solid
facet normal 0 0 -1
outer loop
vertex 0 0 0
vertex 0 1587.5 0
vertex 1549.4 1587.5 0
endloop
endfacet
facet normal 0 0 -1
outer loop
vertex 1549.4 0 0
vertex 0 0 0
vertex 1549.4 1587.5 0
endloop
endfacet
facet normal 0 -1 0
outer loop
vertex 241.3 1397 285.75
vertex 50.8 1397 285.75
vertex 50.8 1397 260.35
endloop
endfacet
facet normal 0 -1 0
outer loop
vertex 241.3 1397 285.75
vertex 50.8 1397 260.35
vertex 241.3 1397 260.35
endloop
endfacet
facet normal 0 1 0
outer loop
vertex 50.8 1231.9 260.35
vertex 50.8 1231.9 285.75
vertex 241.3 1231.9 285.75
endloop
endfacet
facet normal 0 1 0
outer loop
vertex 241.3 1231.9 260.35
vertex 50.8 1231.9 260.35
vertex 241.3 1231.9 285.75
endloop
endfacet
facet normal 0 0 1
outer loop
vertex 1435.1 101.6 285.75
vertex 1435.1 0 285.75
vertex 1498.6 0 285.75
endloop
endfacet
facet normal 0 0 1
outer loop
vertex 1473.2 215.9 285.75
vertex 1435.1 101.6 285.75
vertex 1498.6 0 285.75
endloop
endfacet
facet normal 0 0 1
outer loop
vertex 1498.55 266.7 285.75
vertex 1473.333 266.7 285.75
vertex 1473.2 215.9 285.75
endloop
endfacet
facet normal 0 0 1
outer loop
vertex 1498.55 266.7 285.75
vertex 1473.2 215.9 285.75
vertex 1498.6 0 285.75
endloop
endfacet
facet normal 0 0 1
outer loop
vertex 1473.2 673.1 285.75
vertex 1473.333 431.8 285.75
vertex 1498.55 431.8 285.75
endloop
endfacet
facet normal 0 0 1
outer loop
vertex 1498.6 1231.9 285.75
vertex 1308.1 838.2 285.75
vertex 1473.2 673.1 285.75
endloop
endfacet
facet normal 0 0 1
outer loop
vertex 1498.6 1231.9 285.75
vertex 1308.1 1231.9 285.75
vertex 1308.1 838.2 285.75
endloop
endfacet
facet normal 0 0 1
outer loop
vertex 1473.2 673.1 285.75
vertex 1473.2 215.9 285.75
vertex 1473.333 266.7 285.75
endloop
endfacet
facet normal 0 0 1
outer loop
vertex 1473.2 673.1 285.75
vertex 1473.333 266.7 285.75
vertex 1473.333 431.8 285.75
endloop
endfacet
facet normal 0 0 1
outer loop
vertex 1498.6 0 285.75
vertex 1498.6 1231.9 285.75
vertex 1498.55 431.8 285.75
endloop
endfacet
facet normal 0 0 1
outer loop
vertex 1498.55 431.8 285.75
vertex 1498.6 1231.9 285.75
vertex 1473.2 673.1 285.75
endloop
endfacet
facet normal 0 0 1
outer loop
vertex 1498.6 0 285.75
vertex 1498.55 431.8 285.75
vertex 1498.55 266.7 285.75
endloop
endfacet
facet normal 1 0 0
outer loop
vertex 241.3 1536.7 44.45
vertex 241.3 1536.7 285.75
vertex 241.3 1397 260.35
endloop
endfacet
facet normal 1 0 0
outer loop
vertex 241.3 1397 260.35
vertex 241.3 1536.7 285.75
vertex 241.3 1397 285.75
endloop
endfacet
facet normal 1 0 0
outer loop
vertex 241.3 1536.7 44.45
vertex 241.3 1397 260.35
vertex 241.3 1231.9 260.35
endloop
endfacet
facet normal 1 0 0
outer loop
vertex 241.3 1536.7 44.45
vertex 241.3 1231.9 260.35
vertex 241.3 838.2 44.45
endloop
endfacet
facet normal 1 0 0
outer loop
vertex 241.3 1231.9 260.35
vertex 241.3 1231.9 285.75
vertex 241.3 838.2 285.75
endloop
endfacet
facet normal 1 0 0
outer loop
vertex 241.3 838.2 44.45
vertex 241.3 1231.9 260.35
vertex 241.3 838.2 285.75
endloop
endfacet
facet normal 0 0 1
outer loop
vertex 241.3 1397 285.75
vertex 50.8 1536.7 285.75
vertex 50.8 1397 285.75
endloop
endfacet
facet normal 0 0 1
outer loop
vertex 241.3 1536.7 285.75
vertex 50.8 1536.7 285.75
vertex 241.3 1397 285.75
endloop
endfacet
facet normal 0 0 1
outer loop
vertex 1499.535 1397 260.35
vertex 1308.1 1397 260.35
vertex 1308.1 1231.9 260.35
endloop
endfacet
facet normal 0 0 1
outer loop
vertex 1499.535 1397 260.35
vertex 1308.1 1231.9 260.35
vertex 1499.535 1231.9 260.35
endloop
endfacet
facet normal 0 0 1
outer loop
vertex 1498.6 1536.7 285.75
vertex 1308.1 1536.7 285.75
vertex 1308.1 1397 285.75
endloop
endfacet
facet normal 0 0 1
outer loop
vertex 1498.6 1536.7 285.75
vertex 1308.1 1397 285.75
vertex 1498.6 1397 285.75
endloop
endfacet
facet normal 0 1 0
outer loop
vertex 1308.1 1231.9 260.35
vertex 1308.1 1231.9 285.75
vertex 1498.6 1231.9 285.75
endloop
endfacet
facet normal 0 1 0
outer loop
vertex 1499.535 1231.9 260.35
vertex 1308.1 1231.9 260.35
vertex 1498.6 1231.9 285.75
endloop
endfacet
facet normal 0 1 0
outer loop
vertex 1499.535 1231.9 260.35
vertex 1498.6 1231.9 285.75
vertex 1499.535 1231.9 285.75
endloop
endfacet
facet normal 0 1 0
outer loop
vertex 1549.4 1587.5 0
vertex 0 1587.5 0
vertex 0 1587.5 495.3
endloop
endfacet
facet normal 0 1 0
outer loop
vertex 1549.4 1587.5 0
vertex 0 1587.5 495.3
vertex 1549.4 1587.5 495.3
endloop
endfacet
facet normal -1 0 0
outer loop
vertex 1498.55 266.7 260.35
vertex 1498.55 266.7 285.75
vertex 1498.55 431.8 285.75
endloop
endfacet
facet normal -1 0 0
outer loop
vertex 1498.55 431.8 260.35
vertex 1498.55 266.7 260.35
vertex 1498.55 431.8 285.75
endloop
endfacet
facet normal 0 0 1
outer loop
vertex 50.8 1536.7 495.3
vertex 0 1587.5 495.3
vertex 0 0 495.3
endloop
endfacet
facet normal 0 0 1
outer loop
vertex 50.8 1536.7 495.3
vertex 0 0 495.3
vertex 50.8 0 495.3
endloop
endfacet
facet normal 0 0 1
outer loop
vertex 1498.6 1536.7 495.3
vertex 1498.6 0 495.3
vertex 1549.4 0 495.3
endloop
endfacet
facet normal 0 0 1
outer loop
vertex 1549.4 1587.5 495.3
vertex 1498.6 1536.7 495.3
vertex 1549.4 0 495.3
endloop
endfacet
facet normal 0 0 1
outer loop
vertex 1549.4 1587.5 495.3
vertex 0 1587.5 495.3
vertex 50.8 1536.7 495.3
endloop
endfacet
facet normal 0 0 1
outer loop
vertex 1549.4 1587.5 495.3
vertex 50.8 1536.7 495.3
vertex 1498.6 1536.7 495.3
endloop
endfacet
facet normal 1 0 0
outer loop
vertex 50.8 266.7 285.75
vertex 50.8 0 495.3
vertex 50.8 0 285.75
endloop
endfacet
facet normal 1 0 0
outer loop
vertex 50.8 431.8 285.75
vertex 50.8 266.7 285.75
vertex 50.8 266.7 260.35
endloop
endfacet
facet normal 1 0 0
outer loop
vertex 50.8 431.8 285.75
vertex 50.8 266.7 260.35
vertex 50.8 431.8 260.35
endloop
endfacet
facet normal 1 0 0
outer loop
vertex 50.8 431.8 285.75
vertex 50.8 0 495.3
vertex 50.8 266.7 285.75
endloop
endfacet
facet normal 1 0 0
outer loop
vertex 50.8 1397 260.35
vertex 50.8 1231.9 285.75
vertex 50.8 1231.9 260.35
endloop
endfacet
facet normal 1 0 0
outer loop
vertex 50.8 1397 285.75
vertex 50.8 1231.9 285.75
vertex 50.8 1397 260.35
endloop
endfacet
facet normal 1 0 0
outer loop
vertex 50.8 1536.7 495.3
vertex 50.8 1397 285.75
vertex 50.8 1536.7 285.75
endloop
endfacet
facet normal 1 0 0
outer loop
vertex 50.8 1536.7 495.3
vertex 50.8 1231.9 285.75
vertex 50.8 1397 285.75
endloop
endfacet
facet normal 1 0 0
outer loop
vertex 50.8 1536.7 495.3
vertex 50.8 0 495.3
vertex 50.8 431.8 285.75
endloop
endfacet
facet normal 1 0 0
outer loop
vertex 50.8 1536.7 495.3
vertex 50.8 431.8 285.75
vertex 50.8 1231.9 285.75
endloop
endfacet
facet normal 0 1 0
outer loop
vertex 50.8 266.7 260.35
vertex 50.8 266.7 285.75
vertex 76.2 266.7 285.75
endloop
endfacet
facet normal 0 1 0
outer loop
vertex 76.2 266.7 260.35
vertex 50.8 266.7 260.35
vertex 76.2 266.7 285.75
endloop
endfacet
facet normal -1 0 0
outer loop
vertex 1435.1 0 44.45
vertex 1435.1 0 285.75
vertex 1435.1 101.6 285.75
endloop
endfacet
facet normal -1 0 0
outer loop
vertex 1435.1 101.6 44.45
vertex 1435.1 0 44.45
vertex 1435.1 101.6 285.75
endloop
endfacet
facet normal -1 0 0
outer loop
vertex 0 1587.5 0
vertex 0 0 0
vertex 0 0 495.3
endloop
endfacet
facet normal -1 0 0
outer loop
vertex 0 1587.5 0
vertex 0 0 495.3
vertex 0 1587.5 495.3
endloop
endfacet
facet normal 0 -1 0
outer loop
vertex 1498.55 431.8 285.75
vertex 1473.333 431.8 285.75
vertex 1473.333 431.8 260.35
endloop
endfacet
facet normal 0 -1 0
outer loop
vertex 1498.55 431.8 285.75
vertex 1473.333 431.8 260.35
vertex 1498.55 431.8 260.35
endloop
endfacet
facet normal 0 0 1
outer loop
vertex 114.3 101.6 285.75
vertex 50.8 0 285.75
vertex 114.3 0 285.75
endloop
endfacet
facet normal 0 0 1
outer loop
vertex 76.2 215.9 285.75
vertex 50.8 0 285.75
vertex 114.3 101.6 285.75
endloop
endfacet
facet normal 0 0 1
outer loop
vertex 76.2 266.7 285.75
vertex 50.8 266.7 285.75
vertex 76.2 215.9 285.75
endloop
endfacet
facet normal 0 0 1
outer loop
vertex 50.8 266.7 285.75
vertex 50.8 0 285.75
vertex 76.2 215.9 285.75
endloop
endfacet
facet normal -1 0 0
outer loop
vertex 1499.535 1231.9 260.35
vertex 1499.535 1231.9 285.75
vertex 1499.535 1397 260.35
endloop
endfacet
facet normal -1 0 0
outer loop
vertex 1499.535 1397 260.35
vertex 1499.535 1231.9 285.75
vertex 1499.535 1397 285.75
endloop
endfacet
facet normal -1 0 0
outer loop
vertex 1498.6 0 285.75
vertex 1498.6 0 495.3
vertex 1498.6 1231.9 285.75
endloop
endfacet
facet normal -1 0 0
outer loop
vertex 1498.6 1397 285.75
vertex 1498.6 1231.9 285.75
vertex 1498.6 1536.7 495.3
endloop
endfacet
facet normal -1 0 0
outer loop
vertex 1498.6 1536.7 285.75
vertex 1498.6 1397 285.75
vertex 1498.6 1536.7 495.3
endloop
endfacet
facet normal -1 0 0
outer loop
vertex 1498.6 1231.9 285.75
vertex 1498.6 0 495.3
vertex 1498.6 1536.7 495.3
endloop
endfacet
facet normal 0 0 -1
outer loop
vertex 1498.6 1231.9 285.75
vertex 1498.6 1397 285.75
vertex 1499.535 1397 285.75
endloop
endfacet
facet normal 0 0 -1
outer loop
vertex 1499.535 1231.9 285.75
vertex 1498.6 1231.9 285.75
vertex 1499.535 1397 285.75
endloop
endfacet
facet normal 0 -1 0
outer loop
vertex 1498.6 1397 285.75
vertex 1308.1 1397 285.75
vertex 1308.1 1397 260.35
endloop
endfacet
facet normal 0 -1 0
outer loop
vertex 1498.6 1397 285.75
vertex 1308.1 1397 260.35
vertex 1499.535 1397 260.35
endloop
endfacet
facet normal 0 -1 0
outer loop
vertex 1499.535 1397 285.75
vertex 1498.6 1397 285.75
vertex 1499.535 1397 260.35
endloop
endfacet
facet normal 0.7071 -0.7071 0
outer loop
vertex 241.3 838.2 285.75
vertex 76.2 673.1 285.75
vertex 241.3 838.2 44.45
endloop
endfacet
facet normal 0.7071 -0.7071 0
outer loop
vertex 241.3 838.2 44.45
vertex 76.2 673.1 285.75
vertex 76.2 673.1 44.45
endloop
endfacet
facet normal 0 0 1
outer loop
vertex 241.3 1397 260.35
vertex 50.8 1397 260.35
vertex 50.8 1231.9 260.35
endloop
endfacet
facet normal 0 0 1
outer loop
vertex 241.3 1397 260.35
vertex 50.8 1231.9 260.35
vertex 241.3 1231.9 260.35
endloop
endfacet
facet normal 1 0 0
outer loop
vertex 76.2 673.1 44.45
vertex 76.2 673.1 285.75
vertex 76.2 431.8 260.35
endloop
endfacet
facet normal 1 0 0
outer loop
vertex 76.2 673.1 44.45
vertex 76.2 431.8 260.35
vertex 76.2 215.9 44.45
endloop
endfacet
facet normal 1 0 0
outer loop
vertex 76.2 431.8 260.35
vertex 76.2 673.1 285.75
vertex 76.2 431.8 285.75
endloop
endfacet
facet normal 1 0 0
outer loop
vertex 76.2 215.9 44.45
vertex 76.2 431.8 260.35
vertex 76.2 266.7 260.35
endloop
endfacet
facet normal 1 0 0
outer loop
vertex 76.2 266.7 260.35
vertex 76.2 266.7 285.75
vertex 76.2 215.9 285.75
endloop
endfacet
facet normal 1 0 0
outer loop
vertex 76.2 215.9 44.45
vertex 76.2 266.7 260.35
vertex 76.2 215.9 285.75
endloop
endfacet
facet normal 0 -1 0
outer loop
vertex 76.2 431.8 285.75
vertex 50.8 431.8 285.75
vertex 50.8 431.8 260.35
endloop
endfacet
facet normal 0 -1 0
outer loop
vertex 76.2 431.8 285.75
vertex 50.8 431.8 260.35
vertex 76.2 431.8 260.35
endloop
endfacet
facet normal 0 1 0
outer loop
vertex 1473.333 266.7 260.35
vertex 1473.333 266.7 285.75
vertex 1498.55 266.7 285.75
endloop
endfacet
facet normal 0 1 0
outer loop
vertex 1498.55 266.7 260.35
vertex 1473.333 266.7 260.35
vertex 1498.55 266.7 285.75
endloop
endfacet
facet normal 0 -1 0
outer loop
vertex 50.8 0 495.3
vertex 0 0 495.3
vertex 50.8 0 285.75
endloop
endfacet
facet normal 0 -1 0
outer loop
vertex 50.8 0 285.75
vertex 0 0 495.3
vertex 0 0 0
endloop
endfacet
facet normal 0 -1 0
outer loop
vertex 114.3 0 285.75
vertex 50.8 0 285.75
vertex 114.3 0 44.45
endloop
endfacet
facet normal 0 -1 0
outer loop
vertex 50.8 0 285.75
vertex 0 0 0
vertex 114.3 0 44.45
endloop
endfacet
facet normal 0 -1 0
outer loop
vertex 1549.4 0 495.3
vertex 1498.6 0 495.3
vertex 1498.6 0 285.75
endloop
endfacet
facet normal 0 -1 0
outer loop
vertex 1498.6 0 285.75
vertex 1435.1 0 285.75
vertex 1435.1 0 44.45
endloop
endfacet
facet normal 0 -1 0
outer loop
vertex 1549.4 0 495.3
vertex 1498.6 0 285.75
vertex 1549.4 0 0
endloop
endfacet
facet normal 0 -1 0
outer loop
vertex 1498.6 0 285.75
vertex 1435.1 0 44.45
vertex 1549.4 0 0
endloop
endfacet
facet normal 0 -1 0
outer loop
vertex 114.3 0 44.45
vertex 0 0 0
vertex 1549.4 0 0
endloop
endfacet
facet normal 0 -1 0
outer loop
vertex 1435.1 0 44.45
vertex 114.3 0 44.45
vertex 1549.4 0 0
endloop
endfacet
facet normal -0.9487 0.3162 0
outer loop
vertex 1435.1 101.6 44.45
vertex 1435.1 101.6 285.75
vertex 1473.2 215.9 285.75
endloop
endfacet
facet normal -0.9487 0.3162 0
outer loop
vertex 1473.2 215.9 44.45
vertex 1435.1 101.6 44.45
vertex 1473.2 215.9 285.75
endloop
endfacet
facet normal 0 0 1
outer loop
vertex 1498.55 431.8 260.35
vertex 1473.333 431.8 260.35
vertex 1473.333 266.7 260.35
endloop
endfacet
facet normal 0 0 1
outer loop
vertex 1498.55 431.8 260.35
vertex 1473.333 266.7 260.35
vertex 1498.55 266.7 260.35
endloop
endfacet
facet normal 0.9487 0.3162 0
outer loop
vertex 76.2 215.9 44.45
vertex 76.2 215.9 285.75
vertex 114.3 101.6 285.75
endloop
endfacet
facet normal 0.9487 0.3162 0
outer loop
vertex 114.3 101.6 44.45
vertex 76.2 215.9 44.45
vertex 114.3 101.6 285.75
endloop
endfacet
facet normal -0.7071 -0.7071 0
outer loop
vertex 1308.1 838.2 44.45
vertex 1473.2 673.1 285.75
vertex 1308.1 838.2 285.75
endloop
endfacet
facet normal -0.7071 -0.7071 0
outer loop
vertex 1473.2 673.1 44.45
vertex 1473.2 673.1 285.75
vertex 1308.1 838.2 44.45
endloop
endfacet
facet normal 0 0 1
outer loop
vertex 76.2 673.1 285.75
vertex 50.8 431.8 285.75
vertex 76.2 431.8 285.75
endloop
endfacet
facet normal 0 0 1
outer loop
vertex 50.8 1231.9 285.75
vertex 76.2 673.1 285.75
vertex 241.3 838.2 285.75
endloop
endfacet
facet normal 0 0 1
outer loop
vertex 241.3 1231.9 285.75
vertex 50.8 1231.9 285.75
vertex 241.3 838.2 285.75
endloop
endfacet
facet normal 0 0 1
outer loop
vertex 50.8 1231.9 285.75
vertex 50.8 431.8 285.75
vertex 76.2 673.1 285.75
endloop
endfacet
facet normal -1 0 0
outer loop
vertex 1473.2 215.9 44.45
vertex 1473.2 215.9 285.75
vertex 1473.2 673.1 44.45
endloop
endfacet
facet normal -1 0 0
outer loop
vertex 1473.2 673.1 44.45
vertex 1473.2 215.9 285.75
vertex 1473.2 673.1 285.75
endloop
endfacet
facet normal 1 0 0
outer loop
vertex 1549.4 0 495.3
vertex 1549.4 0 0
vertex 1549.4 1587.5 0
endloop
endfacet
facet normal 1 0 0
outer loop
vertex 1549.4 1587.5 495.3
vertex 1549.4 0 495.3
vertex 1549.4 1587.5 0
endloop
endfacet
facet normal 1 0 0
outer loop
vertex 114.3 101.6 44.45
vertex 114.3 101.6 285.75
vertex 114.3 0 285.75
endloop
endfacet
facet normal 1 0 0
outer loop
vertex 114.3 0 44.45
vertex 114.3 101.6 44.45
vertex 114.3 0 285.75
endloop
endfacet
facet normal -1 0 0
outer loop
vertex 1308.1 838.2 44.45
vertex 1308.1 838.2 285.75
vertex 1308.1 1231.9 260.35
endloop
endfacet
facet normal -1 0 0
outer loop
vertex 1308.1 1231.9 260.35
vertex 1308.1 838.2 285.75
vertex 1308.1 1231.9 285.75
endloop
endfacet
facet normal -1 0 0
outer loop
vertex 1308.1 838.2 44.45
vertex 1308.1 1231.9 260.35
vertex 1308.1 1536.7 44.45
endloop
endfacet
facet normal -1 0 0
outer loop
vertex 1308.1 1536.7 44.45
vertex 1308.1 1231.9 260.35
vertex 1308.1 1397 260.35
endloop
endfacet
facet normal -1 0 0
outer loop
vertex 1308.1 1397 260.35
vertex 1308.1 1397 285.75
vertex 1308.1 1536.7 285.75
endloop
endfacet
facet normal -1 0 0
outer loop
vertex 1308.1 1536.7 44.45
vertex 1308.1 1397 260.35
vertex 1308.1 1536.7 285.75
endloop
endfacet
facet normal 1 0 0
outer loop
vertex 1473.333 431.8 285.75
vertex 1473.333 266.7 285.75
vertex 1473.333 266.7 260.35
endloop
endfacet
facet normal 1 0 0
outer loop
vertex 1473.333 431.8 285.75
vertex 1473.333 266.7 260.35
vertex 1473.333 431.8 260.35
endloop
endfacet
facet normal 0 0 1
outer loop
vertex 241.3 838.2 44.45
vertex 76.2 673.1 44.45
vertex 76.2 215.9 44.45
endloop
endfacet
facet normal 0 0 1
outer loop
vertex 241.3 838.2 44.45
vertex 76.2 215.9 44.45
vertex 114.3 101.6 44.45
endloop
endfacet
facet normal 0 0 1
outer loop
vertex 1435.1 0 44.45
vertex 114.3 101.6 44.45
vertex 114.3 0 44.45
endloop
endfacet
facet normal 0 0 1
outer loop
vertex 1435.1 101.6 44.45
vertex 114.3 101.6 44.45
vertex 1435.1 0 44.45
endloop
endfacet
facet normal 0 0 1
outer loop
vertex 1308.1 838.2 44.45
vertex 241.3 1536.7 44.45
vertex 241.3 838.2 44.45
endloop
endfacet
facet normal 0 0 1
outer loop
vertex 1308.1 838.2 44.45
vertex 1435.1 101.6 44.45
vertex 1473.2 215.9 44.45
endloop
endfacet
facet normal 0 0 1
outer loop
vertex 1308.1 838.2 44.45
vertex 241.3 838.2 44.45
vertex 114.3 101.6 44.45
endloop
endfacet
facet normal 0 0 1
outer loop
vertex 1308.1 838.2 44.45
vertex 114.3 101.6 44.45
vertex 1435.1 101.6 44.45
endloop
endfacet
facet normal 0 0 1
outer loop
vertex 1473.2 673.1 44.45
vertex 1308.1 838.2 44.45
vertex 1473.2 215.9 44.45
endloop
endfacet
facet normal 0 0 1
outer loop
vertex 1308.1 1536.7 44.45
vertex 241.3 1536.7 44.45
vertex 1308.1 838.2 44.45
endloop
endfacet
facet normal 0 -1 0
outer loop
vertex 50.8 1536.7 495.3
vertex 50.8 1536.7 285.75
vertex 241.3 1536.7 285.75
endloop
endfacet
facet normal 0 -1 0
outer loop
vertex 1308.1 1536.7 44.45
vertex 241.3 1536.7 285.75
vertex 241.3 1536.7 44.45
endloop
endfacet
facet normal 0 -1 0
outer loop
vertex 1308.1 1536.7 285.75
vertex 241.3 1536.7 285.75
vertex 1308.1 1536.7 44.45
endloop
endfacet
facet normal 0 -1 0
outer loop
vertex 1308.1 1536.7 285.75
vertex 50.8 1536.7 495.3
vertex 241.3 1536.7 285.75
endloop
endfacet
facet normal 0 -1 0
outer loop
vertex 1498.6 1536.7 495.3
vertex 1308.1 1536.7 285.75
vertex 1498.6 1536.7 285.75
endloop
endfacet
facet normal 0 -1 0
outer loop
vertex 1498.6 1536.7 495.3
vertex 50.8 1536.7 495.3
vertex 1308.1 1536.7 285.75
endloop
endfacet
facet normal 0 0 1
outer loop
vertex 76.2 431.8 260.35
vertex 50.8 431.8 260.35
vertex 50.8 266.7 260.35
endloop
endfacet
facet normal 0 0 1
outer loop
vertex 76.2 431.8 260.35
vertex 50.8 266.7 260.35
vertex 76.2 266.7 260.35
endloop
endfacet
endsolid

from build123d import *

# Parameters (mm, degrees)
F0_W     = 1549.4
F0_H     = 1587.5
F1_DEPTH = 495.3
F2_W     = 1447.8
F2_H     = 1536.7
F3_DEPTH = 209.55
F5_DEPTH = 241.3
F6_SIZE  = 165.09999
F7_SIZE  = 165.09999
F8_W     = 192.0828819275
F8_H     = 165.1
F8_W_2   = 25.4
F8_W_3   = 25.217294693
F8_W_4   = 190.5
F9_DEPTH = 25.4


# Not quite as in the source:
# - a fillet or chamfer is up to 0.001 mm smaller than in the source, because OpenCascade refuses the exact size


with BuildPart() as f1:
    # F0 (on Top) → F1 (new body)
    with BuildSketch(Plane.XY):
        with Locations((774.7, 793.75)):
            Rectangle(F0_W, F0_H)
    extrude(amount=F1_DEPTH)

    # F2 (on face) → F3 (cut)
    with BuildSketch(Plane.XY.offset(495.3)):
        with Locations((774.7, 768.35)):
            Rectangle(F2_W, F2_H)
    extrude(amount=-F3_DEPTH, mode=Mode.SUBTRACT)

    # F4 (on face) → F5 (cut)
    with BuildSketch(Plane.XY.offset(285.75)):
        Polygon((114.3, 101.6), (114.3, 0), (1435.1, 0), (1435.1, 101.6), (1473.2, 215.9), (1473.2, 673.1), (1308.1, 673.1), (1308.1, 1536.7), (241.3, 1536.7), (241.3, 673.1), (76.2, 673.1), (76.2, 215.9), align=None)
    extrude(amount=-F5_DEPTH, mode=Mode.SUBTRACT)

    # F6 (size 165.1 in the source; OpenCascade refuses exactly that, so slightly less here)
    f6_edges = [f1.edges().sort_by_distance(p)[0] for p in [
        (241.3, 673.1, 165.1),
    ]]
    chamfer(f6_edges, length=F6_SIZE)

    # F7 (size 165.1 in the source; OpenCascade refuses exactly that, so slightly less here)
    f7_edges = [f1.edges().sort_by_distance(p)[0] for p in [
        (1308.1, 673.1, 165.1),
    ]]
    chamfer(f7_edges, length=F7_SIZE)

    # F8 (on face) → F9 (cut)
    with BuildSketch(Plane.XY.offset(285.75)):
        with Locations((1403.493642807, 1314.45)):
            Rectangle(F8_W, F8_H)
        with Locations((63.5, 349.25)):
            Rectangle(F8_W_2, F8_H)
        with Locations((1485.9412908554, 349.25)):
            Rectangle(F8_W_3, F8_H)
        with Locations((146.05, 1314.45)):
            Rectangle(F8_W_4, F8_H)
    extrude(amount=-F9_DEPTH, mode=Mode.SUBTRACT)


solid = f1.part
